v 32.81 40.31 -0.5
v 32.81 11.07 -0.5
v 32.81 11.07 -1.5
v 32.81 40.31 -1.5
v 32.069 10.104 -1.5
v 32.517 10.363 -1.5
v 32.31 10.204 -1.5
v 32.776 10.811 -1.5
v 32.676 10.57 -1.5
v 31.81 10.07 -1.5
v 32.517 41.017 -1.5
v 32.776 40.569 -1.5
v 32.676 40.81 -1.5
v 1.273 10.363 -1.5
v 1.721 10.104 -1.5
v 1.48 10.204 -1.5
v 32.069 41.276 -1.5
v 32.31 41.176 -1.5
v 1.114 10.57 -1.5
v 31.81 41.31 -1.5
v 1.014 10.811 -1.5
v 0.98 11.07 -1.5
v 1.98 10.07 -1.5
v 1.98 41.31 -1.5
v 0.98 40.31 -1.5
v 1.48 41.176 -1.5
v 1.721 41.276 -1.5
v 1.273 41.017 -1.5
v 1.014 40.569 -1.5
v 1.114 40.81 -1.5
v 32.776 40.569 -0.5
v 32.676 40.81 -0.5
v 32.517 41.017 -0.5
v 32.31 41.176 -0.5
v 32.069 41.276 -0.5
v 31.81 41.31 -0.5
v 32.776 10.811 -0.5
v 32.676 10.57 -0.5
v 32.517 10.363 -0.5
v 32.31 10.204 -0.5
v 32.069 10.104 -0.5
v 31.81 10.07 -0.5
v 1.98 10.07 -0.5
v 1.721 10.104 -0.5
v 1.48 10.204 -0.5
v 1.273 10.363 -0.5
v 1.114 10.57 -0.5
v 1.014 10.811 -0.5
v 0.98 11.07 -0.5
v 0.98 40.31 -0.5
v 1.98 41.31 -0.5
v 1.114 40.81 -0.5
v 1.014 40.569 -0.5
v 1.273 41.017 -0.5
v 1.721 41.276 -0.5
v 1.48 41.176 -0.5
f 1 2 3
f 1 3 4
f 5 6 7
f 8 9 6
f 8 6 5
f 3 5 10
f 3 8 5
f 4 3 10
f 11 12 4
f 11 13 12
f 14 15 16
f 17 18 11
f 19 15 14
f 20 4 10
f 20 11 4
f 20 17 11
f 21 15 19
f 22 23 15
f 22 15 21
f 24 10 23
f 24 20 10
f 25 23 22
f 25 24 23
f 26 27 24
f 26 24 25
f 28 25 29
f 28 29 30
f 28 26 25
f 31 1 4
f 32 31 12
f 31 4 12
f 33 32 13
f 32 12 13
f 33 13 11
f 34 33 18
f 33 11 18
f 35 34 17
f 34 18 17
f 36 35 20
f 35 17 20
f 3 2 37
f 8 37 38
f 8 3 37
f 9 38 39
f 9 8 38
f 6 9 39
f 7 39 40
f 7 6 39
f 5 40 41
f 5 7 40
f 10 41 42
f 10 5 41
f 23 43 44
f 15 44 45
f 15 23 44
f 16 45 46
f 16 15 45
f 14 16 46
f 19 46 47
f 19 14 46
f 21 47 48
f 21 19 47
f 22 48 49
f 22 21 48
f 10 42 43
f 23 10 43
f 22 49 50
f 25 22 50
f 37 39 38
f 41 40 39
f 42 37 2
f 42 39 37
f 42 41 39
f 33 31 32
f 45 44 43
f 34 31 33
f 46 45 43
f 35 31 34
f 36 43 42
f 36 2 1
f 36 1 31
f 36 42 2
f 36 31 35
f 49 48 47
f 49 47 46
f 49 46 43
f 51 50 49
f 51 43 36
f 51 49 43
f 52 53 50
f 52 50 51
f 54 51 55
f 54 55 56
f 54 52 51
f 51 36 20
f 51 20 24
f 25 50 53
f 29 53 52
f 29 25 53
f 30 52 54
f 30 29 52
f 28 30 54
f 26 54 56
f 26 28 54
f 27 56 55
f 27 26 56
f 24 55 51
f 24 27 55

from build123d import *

# Parameters (mm, degrees)
SKETCH_W     = 31.83
SKETCH_H     = 31.24
PAD_DEPTH    = 1.5
FILLET_R     = 1
POCKET_DEPTH = 0.5


with BuildPart() as part:
    # Sketch → Pad (new body)
    with BuildSketch(Plane(origin=(0, 0, 0), x_dir=(-1, 0, 0), z_dir=(0, 0, -1))):
        with Locations((-16.895, 25.69)):
            Rectangle(SKETCH_W, SKETCH_H)
    extrude(amount=PAD_DEPTH)

    # Fillet
    fillet_edges = [part.edges().sort_by_distance(p)[0] for p in [
        (32.81, 41.31, -0.75),
        (0.98, 41.31, -0.75),
        (0.98, 10.07, -0.75),
        (32.81, 10.07, -0.75),
    ]]
    fillet(fillet_edges, radius=FILLET_R)

    # Fillet Face2 → Pocket (cut)
    with BuildSketch(Plane(origin=(16.895, 25.69, 0), x_dir=(0, 1, 0), z_dir=(0, 0, 1))):
        with BuildLine():
            Line((15.62, -14.915), (15.62, 14.915))
            ThreePointArc((15.62, 14.915), (15.327107, 15.622107), (14.62, 15.915))
            Line((14.62, 15.915), (-14.62, 15.915))
            ThreePointArc((-14.62, 15.915), (-15.327107, 15.622107), (-15.62, 14.915))
            Line((-15.62, 14.915), (-15.62, -14.915))
            ThreePointArc((-15.62, -14.915), (-15.327107, -15.622107), (-14.62, -15.915))
            Line((-14.62, -15.915), (14.62, -15.915))
            ThreePointArc((14.62, -15.915), (15.327107, -15.622107), (15.62, -14.915))
        make_face()
    extrude(amount=-POCKET_DEPTH, mode=Mode.SUBTRACT)


solid = part.part
